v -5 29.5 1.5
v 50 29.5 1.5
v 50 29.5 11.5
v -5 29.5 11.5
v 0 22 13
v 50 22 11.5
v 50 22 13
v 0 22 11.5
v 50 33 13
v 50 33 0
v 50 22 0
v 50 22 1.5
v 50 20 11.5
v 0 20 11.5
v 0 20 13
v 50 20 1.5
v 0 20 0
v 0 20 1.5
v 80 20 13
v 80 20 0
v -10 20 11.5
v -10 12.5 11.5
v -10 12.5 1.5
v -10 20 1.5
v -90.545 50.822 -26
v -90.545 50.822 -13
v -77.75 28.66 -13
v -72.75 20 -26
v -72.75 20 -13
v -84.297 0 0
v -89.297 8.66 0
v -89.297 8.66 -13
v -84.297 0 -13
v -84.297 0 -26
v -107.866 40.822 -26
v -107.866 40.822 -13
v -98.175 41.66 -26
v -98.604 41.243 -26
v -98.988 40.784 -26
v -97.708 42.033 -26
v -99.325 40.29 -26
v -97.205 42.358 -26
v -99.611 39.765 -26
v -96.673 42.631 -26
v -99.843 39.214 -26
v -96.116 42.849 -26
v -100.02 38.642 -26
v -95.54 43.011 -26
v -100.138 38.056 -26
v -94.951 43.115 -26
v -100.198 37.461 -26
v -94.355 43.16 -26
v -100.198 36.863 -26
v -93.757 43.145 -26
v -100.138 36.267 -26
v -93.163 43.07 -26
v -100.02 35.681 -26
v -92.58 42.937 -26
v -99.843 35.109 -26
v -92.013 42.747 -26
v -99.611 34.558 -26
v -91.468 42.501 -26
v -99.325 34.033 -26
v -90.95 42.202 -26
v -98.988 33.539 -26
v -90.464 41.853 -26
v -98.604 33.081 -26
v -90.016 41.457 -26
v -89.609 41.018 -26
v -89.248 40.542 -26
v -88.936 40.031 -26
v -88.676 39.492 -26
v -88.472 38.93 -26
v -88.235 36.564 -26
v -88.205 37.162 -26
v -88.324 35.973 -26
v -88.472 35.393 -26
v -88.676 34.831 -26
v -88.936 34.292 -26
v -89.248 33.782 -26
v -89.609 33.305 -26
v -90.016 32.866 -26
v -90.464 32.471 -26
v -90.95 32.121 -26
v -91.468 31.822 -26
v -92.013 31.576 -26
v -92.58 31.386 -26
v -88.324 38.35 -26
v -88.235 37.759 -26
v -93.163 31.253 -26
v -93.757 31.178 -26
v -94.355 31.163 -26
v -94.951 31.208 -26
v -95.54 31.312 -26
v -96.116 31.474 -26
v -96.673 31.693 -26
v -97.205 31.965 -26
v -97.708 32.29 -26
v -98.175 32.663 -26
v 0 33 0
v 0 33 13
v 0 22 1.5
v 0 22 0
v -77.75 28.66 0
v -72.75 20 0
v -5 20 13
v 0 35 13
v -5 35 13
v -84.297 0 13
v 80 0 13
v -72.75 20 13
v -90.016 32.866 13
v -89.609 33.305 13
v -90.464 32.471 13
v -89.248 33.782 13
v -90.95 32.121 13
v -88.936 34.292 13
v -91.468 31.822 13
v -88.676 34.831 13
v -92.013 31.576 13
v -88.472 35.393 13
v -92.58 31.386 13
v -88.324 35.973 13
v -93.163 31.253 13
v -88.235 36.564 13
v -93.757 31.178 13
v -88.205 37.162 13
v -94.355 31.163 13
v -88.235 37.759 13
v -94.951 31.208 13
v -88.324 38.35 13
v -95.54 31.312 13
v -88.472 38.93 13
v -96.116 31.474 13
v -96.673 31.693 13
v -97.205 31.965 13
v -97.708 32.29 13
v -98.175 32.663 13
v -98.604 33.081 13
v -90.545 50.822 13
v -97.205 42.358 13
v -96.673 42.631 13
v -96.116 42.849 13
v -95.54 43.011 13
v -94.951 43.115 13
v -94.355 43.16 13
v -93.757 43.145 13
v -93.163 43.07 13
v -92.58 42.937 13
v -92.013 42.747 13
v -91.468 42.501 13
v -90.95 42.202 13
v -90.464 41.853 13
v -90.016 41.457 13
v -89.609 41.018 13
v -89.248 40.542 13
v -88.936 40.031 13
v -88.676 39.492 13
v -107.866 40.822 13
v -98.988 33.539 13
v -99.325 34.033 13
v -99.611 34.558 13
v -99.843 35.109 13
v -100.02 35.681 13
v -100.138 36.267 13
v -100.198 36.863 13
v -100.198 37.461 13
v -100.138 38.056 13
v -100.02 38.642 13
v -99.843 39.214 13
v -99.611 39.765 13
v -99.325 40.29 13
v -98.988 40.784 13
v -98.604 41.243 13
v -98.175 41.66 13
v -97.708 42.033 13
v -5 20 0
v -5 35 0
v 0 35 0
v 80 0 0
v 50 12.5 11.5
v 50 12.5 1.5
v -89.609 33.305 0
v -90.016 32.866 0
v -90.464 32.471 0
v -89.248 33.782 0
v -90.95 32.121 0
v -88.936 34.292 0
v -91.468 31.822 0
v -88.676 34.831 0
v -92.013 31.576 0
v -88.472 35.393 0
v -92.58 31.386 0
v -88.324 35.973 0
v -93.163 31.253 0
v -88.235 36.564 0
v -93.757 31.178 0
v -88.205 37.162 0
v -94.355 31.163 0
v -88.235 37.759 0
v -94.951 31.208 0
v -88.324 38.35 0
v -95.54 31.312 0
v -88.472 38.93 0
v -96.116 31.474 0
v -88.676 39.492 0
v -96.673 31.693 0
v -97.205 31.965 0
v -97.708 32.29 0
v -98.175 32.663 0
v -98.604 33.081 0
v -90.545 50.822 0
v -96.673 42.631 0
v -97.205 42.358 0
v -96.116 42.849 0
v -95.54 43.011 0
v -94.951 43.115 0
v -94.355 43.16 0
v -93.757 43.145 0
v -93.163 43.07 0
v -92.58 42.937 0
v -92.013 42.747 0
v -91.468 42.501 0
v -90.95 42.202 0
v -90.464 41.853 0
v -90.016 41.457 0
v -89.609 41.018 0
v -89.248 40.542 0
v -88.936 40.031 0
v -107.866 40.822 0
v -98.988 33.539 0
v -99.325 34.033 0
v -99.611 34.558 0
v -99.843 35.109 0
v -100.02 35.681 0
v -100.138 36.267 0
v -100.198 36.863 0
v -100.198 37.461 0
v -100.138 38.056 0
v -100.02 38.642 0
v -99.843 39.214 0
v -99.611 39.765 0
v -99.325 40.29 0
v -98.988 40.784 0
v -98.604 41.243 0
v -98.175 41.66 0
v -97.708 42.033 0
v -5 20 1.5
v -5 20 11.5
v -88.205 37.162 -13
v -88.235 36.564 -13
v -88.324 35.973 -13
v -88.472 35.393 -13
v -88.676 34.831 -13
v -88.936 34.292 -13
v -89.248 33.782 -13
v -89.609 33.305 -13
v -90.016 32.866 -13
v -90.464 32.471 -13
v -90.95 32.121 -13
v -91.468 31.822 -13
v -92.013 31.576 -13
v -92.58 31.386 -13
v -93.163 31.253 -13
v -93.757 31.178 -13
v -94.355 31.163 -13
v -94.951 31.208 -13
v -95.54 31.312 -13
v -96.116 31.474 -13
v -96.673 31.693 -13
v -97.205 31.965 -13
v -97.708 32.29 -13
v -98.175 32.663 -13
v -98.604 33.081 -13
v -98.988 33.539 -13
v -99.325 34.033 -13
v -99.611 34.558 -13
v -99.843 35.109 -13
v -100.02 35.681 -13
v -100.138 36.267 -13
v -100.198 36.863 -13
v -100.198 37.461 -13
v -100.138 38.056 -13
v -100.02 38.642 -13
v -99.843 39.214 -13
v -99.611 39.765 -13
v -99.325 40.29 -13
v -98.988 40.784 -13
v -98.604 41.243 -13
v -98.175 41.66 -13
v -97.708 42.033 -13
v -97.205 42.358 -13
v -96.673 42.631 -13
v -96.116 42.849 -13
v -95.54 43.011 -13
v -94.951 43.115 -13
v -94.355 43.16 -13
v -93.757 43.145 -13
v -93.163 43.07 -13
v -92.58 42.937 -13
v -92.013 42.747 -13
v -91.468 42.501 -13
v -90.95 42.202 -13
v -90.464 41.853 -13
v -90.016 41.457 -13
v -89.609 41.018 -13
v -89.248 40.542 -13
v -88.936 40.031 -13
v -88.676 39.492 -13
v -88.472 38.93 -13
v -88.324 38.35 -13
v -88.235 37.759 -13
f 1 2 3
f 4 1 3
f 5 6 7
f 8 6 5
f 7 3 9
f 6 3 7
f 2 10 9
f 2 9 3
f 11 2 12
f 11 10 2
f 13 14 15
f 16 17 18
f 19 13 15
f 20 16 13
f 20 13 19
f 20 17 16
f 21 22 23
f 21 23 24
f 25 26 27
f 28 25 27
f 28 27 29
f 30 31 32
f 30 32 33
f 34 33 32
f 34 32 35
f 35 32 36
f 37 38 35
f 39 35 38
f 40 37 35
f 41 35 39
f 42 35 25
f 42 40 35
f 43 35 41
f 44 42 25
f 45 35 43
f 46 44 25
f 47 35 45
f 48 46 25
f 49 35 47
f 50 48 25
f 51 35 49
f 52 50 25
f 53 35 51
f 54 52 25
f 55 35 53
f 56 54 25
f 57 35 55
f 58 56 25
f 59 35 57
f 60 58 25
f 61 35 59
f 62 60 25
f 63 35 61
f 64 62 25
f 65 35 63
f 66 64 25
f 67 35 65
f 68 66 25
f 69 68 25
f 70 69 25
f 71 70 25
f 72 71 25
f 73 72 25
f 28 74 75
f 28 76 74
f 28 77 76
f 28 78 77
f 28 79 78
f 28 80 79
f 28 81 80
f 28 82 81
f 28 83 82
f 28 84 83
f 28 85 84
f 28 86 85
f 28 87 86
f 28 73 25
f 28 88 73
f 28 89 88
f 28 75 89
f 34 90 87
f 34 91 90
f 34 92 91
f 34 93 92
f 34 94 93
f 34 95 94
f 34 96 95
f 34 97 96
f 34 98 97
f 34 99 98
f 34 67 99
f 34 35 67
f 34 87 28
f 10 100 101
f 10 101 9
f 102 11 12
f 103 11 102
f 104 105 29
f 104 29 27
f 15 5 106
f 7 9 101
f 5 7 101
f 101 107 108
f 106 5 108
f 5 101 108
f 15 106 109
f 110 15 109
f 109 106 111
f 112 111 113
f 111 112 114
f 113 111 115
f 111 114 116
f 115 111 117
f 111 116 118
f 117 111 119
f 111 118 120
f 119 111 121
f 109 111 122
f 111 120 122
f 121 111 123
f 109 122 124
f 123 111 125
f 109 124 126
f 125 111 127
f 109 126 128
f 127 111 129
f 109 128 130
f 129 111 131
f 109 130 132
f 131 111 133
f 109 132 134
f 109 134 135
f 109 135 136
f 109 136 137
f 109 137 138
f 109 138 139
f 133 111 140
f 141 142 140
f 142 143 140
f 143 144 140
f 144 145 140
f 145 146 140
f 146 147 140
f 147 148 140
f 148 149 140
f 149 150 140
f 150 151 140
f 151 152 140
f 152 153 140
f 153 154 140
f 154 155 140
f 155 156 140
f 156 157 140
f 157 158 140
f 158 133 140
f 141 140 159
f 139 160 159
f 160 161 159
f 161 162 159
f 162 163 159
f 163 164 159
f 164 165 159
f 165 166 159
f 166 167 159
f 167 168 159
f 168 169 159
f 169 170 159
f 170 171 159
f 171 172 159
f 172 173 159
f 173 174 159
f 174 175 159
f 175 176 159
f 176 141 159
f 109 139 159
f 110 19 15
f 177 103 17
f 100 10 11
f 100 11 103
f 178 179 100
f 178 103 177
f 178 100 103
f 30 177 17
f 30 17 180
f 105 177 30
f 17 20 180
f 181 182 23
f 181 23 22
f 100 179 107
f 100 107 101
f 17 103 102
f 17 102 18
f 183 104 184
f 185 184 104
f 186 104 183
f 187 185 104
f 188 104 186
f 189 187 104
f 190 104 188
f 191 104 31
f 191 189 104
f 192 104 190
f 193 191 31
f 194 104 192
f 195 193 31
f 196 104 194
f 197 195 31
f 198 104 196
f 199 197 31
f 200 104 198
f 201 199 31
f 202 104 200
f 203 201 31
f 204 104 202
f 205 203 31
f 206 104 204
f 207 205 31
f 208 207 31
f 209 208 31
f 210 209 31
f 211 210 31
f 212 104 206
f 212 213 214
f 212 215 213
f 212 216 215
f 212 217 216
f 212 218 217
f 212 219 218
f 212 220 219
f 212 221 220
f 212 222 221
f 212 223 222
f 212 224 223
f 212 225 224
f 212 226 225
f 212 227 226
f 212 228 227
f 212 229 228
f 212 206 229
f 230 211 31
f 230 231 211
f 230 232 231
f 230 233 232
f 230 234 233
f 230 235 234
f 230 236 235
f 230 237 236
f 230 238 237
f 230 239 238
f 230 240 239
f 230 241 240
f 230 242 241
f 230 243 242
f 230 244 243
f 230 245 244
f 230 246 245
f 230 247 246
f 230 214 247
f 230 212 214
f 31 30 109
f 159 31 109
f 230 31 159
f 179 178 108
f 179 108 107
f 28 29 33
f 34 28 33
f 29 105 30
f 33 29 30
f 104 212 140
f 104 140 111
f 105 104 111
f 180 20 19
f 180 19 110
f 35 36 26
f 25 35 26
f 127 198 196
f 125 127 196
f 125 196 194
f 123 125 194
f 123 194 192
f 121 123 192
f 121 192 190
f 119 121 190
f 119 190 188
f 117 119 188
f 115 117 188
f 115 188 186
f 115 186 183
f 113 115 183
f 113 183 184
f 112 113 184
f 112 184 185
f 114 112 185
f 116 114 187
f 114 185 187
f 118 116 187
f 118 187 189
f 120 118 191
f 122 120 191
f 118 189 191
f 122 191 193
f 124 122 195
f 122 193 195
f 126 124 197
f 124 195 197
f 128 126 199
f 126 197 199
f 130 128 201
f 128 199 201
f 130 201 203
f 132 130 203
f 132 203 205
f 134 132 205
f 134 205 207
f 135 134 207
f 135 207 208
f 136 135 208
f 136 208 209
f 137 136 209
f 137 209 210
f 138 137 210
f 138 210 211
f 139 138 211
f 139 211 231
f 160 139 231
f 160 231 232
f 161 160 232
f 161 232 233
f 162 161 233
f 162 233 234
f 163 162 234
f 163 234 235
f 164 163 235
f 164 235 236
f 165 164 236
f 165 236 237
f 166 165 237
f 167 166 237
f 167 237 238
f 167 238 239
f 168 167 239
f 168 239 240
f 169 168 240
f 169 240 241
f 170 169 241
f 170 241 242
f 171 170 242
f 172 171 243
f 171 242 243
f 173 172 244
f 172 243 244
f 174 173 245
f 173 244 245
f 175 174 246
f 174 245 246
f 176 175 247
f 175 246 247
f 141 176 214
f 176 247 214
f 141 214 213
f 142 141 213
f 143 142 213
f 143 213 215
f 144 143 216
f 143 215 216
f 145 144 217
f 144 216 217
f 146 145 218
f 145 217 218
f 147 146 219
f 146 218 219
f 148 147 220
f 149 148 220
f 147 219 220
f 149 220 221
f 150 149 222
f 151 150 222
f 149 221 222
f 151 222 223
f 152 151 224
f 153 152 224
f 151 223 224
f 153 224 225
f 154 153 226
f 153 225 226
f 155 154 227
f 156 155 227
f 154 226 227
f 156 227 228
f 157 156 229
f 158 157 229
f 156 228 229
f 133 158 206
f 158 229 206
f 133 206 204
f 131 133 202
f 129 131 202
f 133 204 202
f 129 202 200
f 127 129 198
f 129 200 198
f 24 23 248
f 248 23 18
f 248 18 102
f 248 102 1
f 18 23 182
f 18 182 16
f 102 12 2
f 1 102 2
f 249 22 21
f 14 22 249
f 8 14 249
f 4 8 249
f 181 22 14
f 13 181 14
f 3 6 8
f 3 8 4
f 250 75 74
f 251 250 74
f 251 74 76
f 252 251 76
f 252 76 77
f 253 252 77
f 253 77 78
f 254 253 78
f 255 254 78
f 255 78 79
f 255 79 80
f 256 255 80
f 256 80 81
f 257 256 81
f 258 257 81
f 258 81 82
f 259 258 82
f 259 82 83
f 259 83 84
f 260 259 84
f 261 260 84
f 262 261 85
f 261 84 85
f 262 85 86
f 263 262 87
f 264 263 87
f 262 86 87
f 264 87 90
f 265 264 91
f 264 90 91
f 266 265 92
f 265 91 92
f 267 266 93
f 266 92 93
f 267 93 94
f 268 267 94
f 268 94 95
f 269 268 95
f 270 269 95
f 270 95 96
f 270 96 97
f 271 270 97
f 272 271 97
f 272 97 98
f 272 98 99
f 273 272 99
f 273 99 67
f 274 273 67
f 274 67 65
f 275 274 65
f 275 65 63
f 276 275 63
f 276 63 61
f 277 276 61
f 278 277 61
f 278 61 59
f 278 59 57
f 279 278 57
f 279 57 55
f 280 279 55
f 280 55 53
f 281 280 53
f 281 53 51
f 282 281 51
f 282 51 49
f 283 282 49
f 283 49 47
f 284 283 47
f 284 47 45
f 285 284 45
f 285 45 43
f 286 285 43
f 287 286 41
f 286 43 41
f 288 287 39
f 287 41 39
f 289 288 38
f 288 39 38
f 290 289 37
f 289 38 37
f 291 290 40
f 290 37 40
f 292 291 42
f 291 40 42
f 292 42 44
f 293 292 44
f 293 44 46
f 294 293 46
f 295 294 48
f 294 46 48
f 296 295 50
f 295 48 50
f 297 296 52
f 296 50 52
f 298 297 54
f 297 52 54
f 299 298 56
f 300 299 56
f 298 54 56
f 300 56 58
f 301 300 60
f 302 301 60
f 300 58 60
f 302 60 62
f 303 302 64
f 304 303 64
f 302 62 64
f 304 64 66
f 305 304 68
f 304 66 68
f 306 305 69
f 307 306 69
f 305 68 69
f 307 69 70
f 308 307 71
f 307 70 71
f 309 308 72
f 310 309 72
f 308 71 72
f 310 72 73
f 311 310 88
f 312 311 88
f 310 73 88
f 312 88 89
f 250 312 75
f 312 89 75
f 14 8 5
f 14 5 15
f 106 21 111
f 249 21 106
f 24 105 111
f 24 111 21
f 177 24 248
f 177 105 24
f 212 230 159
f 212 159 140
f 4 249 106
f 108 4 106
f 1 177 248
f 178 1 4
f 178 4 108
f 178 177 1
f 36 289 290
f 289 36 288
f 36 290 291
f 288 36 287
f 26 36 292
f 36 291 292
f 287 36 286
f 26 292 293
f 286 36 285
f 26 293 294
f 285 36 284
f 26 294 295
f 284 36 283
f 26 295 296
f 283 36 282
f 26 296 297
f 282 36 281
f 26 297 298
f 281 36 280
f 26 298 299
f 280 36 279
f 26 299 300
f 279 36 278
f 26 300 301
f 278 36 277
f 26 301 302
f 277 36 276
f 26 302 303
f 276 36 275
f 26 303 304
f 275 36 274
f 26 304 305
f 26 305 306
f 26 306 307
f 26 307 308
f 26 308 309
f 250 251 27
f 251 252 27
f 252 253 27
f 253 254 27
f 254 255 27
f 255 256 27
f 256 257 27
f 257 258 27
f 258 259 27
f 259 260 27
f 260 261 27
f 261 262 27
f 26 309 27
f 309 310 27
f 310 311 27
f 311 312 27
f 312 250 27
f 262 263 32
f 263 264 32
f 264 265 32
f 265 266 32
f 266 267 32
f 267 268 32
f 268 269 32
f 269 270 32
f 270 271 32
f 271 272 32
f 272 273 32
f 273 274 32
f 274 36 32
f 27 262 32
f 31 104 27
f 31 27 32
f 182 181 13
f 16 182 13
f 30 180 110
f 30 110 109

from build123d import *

# Parameters (mm, degrees)
PAD_DEPTH       = 13
PAD001_DEPTH    = 13
PAD002_DEPTH    = 13
SKETCH004_R     = 6
POCKET_DEPTH    = 39.001
SKETCH006_W     = 17
SKETCH006_H     = 10
POCKET001_DEPTH = 60


with BuildPart() as part:
    # Sketch001 → Pad (new body)
    with BuildSketch(Plane.XY):
        Polygon((-90.545, 50.821844), (-72.75, 20), (-5, 20), (-5, 35), (0, 35), (0, 33), (50, 33), (50, 22), (0, 22), (0, 20), (80, 20), (80, 0), (-84.297005, 0), (-107.865508, 40.821844), align=None)
    extrude(amount=PAD_DEPTH)

    # Sketch002 (on Face15 of Pad) → Pad001 (join)
    with BuildSketch(Plane(origin=(0, 0, 0), x_dir=(1, 0, 0), z_dir=(0, 0, -1))):
        Polygon((-84.297005, 0), (-72.75, -20), (-77.75, -28.660254), (-89.297005, -8.660254), align=None)
    extrude(amount=PAD001_DEPTH)

    # Sketch003 (on Face12 of Pad001) → Pad002 (join)
    with BuildSketch(Plane(origin=(0, 0, -13), x_dir=(1, 0, 0), z_dir=(0, 0, -1))):
        Polygon((-84.297005, 0), (-107.865508, -40.821844), (-90.545, -50.821844), (-72.75, -20), align=None)
    extrude(amount=PAD002_DEPTH)

    # Sketch004 (on Face26 of Pad002) → Pocket (cut, through all)
    with BuildSketch(Plane(origin=(0, 0, -26), x_dir=(1, 0, 0), z_dir=(0, 0, -1))):
        with Locations((-94.205254, -37.16159)):
            Circle(SKETCH004_R)
    extrude(amount=-POCKET_DEPTH, mode=Mode.SUBTRACT)

    # Sketch006 (on Face21 of Pocket) → Pocket001 (cut)
    with BuildSketch(Plane.YZ.offset(50)):
        with Locations((21, 6.5)):
            Rectangle(SKETCH006_W, SKETCH006_H)
    extrude(amount=-POCKET001_DEPTH, mode=Mode.SUBTRACT)


solid = part.part
